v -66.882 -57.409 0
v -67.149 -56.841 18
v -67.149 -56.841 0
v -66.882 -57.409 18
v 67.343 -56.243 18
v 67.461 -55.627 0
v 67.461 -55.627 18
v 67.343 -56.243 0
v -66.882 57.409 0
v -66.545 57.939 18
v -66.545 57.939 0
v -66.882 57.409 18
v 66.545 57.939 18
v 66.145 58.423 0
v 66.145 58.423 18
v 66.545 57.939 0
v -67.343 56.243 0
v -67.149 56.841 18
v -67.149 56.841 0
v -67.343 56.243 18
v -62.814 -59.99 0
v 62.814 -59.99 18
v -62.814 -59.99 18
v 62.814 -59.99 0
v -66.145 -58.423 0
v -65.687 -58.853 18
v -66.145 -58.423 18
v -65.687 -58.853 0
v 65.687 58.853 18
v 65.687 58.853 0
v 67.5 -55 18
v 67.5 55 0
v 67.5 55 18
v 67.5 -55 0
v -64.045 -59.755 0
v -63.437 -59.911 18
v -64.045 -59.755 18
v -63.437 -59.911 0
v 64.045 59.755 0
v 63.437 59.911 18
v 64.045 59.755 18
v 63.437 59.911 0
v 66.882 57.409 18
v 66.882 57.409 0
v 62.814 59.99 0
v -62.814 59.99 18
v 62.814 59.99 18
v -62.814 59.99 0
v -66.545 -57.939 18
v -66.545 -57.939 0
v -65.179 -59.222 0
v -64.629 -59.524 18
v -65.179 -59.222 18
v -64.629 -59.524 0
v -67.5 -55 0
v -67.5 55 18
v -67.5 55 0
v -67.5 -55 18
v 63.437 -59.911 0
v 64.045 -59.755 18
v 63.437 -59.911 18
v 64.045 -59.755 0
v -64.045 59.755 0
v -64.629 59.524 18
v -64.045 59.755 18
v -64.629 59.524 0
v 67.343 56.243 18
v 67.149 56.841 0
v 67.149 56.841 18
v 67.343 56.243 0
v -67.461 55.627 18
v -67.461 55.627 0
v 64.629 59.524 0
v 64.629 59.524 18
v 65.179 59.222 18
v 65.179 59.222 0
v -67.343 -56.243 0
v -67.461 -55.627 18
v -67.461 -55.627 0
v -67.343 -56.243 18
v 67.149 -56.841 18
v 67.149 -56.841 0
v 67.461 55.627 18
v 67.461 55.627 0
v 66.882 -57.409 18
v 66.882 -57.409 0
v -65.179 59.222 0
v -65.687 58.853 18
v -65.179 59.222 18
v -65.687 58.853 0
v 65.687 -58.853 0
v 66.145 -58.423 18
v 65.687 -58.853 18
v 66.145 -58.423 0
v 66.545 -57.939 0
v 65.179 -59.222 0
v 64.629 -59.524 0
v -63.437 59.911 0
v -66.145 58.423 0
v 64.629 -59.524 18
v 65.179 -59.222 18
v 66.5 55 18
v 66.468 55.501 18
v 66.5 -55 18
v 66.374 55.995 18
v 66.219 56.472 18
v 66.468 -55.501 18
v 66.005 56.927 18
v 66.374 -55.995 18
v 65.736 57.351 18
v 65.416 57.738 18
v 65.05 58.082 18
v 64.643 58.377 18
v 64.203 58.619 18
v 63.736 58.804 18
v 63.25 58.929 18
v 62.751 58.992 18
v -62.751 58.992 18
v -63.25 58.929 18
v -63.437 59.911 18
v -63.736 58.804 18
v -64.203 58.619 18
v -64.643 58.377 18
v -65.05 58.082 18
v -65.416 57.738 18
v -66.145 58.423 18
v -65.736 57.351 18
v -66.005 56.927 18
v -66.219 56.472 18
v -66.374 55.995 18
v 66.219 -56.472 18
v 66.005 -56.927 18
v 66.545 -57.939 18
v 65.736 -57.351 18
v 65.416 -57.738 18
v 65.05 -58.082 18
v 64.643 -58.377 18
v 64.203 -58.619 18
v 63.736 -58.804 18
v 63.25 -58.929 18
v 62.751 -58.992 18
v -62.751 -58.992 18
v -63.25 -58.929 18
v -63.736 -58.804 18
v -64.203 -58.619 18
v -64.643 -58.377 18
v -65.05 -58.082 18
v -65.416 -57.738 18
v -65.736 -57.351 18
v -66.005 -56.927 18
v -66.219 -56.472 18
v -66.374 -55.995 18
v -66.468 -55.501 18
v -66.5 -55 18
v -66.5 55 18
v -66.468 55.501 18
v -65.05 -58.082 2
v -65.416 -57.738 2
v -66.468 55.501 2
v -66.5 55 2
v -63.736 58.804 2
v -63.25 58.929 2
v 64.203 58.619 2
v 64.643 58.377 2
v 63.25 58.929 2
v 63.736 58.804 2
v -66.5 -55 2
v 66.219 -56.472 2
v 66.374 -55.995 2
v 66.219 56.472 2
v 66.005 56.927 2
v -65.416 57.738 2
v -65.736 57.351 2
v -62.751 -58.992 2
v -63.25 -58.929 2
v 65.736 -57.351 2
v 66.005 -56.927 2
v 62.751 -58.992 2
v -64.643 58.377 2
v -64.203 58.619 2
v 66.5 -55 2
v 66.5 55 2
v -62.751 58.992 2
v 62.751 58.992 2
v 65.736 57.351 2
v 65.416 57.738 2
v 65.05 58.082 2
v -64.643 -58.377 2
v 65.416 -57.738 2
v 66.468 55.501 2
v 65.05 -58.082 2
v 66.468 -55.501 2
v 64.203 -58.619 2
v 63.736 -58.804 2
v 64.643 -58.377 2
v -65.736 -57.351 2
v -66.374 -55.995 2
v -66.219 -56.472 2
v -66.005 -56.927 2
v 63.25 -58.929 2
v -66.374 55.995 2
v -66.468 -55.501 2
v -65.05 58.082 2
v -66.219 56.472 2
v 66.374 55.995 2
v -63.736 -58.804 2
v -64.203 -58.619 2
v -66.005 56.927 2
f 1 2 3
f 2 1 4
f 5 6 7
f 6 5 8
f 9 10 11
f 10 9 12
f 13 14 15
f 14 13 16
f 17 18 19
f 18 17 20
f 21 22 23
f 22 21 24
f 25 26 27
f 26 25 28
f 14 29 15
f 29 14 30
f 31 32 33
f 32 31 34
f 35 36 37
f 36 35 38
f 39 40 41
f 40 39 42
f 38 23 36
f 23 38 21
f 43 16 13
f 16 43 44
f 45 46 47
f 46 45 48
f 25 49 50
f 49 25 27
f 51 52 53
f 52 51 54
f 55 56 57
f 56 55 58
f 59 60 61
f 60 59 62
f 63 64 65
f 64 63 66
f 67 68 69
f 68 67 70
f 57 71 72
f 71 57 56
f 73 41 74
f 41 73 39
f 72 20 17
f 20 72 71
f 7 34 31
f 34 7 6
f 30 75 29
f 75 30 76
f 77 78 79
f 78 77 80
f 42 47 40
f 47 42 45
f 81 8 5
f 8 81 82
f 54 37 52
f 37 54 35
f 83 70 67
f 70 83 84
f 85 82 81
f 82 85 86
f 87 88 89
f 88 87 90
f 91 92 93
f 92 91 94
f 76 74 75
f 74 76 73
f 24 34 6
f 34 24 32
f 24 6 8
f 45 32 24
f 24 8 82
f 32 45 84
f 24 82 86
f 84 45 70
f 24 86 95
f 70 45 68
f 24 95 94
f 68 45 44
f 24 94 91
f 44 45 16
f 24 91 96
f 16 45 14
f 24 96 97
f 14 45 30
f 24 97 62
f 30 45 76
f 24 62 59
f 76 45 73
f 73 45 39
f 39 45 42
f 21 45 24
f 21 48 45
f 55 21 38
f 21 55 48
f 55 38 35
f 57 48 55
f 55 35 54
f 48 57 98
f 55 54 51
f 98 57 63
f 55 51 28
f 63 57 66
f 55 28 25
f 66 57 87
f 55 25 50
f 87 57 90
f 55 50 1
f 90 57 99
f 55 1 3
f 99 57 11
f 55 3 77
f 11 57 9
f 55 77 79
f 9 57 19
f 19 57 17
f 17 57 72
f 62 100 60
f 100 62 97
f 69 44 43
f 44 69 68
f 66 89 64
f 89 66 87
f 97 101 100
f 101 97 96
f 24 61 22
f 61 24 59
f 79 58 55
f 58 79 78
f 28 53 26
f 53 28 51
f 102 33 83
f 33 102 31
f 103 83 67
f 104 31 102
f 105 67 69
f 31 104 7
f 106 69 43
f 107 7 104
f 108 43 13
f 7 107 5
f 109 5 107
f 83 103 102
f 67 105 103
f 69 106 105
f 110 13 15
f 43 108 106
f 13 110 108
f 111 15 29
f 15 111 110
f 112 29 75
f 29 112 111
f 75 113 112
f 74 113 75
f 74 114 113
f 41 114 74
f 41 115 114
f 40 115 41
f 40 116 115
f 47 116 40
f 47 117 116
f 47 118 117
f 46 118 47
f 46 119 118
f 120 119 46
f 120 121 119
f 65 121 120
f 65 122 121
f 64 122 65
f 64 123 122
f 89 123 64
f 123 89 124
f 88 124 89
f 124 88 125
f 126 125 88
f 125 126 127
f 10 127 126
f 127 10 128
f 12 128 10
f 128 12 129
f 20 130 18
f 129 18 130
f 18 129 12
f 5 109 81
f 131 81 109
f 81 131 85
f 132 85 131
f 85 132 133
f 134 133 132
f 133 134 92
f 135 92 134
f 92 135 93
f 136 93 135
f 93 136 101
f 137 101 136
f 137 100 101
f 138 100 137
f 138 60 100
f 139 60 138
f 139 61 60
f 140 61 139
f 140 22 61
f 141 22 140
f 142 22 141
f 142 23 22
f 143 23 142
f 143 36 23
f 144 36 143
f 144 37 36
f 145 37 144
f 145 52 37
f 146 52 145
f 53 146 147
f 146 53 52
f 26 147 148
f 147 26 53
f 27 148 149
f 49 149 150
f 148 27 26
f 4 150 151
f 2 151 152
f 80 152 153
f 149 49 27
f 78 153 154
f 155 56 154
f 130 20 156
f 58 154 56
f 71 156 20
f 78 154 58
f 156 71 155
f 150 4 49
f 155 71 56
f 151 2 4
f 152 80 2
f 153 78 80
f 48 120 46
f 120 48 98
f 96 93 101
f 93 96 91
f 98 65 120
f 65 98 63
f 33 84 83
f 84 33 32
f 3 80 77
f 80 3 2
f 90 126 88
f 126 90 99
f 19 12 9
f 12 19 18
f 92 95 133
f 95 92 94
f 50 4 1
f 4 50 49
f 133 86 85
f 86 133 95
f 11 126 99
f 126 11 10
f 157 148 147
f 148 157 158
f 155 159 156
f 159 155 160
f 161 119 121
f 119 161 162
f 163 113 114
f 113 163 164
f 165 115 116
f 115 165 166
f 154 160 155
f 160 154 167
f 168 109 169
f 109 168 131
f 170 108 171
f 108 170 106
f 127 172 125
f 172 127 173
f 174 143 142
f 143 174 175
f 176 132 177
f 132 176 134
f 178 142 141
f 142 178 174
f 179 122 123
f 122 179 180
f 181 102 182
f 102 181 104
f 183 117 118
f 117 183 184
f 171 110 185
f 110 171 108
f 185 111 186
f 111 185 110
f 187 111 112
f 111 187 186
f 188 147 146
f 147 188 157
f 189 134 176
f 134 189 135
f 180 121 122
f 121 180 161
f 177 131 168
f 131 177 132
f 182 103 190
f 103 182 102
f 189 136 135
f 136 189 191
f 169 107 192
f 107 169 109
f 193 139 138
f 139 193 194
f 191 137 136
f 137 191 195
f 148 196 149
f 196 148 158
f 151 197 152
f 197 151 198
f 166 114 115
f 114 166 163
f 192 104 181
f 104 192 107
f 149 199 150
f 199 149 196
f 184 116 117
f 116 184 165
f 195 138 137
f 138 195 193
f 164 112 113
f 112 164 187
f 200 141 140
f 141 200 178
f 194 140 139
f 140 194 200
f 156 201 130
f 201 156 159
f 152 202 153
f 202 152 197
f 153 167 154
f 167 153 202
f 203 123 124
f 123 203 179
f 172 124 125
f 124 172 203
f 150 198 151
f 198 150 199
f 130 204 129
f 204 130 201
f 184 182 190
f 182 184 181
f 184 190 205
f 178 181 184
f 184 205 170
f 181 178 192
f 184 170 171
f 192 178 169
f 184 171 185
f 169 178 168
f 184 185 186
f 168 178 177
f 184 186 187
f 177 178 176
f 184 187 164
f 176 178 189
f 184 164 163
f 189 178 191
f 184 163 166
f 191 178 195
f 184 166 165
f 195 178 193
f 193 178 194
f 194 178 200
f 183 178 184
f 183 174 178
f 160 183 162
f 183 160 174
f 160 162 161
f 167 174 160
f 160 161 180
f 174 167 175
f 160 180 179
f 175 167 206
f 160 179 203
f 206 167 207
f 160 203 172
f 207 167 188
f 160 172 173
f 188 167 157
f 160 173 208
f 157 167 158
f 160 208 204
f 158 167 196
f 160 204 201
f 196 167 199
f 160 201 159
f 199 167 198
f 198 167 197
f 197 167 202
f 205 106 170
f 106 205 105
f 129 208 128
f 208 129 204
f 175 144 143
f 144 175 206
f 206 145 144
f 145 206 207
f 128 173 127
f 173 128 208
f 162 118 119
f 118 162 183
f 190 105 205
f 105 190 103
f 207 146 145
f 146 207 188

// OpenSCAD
$fn = 50;


difference() {
	union() {
		hull() {
			translate(v = [-62.5000000000, 55.0000000000, 0]) {
				cylinder(h = 18, r = 5);
			}
			translate(v = [62.5000000000, 55.0000000000, 0]) {
				cylinder(h = 18, r = 5);
			}
			translate(v = [-62.5000000000, -55.0000000000, 0]) {
				cylinder(h = 18, r = 5);
			}
			translate(v = [62.5000000000, -55.0000000000, 0]) {
				cylinder(h = 18, r = 5);
			}
		}
	}
	union() {
		translate(v = [0, 0, 2]) {
			hull() {
				translate(v = [-62.5000000000, 55.0000000000, 0]) {
					cylinder(h = 16, r = 4);
				}
				translate(v = [62.5000000000, 55.0000000000, 0]) {
					cylinder(h = 16, r = 4);
				}
				translate(v = [-62.5000000000, -55.0000000000, 0]) {
					cylinder(h = 16, r = 4);
				}
				translate(v = [62.5000000000, -55.0000000000, 0]) {
					cylinder(h = 16, r = 4);
				}
			}
		}
	}
}
